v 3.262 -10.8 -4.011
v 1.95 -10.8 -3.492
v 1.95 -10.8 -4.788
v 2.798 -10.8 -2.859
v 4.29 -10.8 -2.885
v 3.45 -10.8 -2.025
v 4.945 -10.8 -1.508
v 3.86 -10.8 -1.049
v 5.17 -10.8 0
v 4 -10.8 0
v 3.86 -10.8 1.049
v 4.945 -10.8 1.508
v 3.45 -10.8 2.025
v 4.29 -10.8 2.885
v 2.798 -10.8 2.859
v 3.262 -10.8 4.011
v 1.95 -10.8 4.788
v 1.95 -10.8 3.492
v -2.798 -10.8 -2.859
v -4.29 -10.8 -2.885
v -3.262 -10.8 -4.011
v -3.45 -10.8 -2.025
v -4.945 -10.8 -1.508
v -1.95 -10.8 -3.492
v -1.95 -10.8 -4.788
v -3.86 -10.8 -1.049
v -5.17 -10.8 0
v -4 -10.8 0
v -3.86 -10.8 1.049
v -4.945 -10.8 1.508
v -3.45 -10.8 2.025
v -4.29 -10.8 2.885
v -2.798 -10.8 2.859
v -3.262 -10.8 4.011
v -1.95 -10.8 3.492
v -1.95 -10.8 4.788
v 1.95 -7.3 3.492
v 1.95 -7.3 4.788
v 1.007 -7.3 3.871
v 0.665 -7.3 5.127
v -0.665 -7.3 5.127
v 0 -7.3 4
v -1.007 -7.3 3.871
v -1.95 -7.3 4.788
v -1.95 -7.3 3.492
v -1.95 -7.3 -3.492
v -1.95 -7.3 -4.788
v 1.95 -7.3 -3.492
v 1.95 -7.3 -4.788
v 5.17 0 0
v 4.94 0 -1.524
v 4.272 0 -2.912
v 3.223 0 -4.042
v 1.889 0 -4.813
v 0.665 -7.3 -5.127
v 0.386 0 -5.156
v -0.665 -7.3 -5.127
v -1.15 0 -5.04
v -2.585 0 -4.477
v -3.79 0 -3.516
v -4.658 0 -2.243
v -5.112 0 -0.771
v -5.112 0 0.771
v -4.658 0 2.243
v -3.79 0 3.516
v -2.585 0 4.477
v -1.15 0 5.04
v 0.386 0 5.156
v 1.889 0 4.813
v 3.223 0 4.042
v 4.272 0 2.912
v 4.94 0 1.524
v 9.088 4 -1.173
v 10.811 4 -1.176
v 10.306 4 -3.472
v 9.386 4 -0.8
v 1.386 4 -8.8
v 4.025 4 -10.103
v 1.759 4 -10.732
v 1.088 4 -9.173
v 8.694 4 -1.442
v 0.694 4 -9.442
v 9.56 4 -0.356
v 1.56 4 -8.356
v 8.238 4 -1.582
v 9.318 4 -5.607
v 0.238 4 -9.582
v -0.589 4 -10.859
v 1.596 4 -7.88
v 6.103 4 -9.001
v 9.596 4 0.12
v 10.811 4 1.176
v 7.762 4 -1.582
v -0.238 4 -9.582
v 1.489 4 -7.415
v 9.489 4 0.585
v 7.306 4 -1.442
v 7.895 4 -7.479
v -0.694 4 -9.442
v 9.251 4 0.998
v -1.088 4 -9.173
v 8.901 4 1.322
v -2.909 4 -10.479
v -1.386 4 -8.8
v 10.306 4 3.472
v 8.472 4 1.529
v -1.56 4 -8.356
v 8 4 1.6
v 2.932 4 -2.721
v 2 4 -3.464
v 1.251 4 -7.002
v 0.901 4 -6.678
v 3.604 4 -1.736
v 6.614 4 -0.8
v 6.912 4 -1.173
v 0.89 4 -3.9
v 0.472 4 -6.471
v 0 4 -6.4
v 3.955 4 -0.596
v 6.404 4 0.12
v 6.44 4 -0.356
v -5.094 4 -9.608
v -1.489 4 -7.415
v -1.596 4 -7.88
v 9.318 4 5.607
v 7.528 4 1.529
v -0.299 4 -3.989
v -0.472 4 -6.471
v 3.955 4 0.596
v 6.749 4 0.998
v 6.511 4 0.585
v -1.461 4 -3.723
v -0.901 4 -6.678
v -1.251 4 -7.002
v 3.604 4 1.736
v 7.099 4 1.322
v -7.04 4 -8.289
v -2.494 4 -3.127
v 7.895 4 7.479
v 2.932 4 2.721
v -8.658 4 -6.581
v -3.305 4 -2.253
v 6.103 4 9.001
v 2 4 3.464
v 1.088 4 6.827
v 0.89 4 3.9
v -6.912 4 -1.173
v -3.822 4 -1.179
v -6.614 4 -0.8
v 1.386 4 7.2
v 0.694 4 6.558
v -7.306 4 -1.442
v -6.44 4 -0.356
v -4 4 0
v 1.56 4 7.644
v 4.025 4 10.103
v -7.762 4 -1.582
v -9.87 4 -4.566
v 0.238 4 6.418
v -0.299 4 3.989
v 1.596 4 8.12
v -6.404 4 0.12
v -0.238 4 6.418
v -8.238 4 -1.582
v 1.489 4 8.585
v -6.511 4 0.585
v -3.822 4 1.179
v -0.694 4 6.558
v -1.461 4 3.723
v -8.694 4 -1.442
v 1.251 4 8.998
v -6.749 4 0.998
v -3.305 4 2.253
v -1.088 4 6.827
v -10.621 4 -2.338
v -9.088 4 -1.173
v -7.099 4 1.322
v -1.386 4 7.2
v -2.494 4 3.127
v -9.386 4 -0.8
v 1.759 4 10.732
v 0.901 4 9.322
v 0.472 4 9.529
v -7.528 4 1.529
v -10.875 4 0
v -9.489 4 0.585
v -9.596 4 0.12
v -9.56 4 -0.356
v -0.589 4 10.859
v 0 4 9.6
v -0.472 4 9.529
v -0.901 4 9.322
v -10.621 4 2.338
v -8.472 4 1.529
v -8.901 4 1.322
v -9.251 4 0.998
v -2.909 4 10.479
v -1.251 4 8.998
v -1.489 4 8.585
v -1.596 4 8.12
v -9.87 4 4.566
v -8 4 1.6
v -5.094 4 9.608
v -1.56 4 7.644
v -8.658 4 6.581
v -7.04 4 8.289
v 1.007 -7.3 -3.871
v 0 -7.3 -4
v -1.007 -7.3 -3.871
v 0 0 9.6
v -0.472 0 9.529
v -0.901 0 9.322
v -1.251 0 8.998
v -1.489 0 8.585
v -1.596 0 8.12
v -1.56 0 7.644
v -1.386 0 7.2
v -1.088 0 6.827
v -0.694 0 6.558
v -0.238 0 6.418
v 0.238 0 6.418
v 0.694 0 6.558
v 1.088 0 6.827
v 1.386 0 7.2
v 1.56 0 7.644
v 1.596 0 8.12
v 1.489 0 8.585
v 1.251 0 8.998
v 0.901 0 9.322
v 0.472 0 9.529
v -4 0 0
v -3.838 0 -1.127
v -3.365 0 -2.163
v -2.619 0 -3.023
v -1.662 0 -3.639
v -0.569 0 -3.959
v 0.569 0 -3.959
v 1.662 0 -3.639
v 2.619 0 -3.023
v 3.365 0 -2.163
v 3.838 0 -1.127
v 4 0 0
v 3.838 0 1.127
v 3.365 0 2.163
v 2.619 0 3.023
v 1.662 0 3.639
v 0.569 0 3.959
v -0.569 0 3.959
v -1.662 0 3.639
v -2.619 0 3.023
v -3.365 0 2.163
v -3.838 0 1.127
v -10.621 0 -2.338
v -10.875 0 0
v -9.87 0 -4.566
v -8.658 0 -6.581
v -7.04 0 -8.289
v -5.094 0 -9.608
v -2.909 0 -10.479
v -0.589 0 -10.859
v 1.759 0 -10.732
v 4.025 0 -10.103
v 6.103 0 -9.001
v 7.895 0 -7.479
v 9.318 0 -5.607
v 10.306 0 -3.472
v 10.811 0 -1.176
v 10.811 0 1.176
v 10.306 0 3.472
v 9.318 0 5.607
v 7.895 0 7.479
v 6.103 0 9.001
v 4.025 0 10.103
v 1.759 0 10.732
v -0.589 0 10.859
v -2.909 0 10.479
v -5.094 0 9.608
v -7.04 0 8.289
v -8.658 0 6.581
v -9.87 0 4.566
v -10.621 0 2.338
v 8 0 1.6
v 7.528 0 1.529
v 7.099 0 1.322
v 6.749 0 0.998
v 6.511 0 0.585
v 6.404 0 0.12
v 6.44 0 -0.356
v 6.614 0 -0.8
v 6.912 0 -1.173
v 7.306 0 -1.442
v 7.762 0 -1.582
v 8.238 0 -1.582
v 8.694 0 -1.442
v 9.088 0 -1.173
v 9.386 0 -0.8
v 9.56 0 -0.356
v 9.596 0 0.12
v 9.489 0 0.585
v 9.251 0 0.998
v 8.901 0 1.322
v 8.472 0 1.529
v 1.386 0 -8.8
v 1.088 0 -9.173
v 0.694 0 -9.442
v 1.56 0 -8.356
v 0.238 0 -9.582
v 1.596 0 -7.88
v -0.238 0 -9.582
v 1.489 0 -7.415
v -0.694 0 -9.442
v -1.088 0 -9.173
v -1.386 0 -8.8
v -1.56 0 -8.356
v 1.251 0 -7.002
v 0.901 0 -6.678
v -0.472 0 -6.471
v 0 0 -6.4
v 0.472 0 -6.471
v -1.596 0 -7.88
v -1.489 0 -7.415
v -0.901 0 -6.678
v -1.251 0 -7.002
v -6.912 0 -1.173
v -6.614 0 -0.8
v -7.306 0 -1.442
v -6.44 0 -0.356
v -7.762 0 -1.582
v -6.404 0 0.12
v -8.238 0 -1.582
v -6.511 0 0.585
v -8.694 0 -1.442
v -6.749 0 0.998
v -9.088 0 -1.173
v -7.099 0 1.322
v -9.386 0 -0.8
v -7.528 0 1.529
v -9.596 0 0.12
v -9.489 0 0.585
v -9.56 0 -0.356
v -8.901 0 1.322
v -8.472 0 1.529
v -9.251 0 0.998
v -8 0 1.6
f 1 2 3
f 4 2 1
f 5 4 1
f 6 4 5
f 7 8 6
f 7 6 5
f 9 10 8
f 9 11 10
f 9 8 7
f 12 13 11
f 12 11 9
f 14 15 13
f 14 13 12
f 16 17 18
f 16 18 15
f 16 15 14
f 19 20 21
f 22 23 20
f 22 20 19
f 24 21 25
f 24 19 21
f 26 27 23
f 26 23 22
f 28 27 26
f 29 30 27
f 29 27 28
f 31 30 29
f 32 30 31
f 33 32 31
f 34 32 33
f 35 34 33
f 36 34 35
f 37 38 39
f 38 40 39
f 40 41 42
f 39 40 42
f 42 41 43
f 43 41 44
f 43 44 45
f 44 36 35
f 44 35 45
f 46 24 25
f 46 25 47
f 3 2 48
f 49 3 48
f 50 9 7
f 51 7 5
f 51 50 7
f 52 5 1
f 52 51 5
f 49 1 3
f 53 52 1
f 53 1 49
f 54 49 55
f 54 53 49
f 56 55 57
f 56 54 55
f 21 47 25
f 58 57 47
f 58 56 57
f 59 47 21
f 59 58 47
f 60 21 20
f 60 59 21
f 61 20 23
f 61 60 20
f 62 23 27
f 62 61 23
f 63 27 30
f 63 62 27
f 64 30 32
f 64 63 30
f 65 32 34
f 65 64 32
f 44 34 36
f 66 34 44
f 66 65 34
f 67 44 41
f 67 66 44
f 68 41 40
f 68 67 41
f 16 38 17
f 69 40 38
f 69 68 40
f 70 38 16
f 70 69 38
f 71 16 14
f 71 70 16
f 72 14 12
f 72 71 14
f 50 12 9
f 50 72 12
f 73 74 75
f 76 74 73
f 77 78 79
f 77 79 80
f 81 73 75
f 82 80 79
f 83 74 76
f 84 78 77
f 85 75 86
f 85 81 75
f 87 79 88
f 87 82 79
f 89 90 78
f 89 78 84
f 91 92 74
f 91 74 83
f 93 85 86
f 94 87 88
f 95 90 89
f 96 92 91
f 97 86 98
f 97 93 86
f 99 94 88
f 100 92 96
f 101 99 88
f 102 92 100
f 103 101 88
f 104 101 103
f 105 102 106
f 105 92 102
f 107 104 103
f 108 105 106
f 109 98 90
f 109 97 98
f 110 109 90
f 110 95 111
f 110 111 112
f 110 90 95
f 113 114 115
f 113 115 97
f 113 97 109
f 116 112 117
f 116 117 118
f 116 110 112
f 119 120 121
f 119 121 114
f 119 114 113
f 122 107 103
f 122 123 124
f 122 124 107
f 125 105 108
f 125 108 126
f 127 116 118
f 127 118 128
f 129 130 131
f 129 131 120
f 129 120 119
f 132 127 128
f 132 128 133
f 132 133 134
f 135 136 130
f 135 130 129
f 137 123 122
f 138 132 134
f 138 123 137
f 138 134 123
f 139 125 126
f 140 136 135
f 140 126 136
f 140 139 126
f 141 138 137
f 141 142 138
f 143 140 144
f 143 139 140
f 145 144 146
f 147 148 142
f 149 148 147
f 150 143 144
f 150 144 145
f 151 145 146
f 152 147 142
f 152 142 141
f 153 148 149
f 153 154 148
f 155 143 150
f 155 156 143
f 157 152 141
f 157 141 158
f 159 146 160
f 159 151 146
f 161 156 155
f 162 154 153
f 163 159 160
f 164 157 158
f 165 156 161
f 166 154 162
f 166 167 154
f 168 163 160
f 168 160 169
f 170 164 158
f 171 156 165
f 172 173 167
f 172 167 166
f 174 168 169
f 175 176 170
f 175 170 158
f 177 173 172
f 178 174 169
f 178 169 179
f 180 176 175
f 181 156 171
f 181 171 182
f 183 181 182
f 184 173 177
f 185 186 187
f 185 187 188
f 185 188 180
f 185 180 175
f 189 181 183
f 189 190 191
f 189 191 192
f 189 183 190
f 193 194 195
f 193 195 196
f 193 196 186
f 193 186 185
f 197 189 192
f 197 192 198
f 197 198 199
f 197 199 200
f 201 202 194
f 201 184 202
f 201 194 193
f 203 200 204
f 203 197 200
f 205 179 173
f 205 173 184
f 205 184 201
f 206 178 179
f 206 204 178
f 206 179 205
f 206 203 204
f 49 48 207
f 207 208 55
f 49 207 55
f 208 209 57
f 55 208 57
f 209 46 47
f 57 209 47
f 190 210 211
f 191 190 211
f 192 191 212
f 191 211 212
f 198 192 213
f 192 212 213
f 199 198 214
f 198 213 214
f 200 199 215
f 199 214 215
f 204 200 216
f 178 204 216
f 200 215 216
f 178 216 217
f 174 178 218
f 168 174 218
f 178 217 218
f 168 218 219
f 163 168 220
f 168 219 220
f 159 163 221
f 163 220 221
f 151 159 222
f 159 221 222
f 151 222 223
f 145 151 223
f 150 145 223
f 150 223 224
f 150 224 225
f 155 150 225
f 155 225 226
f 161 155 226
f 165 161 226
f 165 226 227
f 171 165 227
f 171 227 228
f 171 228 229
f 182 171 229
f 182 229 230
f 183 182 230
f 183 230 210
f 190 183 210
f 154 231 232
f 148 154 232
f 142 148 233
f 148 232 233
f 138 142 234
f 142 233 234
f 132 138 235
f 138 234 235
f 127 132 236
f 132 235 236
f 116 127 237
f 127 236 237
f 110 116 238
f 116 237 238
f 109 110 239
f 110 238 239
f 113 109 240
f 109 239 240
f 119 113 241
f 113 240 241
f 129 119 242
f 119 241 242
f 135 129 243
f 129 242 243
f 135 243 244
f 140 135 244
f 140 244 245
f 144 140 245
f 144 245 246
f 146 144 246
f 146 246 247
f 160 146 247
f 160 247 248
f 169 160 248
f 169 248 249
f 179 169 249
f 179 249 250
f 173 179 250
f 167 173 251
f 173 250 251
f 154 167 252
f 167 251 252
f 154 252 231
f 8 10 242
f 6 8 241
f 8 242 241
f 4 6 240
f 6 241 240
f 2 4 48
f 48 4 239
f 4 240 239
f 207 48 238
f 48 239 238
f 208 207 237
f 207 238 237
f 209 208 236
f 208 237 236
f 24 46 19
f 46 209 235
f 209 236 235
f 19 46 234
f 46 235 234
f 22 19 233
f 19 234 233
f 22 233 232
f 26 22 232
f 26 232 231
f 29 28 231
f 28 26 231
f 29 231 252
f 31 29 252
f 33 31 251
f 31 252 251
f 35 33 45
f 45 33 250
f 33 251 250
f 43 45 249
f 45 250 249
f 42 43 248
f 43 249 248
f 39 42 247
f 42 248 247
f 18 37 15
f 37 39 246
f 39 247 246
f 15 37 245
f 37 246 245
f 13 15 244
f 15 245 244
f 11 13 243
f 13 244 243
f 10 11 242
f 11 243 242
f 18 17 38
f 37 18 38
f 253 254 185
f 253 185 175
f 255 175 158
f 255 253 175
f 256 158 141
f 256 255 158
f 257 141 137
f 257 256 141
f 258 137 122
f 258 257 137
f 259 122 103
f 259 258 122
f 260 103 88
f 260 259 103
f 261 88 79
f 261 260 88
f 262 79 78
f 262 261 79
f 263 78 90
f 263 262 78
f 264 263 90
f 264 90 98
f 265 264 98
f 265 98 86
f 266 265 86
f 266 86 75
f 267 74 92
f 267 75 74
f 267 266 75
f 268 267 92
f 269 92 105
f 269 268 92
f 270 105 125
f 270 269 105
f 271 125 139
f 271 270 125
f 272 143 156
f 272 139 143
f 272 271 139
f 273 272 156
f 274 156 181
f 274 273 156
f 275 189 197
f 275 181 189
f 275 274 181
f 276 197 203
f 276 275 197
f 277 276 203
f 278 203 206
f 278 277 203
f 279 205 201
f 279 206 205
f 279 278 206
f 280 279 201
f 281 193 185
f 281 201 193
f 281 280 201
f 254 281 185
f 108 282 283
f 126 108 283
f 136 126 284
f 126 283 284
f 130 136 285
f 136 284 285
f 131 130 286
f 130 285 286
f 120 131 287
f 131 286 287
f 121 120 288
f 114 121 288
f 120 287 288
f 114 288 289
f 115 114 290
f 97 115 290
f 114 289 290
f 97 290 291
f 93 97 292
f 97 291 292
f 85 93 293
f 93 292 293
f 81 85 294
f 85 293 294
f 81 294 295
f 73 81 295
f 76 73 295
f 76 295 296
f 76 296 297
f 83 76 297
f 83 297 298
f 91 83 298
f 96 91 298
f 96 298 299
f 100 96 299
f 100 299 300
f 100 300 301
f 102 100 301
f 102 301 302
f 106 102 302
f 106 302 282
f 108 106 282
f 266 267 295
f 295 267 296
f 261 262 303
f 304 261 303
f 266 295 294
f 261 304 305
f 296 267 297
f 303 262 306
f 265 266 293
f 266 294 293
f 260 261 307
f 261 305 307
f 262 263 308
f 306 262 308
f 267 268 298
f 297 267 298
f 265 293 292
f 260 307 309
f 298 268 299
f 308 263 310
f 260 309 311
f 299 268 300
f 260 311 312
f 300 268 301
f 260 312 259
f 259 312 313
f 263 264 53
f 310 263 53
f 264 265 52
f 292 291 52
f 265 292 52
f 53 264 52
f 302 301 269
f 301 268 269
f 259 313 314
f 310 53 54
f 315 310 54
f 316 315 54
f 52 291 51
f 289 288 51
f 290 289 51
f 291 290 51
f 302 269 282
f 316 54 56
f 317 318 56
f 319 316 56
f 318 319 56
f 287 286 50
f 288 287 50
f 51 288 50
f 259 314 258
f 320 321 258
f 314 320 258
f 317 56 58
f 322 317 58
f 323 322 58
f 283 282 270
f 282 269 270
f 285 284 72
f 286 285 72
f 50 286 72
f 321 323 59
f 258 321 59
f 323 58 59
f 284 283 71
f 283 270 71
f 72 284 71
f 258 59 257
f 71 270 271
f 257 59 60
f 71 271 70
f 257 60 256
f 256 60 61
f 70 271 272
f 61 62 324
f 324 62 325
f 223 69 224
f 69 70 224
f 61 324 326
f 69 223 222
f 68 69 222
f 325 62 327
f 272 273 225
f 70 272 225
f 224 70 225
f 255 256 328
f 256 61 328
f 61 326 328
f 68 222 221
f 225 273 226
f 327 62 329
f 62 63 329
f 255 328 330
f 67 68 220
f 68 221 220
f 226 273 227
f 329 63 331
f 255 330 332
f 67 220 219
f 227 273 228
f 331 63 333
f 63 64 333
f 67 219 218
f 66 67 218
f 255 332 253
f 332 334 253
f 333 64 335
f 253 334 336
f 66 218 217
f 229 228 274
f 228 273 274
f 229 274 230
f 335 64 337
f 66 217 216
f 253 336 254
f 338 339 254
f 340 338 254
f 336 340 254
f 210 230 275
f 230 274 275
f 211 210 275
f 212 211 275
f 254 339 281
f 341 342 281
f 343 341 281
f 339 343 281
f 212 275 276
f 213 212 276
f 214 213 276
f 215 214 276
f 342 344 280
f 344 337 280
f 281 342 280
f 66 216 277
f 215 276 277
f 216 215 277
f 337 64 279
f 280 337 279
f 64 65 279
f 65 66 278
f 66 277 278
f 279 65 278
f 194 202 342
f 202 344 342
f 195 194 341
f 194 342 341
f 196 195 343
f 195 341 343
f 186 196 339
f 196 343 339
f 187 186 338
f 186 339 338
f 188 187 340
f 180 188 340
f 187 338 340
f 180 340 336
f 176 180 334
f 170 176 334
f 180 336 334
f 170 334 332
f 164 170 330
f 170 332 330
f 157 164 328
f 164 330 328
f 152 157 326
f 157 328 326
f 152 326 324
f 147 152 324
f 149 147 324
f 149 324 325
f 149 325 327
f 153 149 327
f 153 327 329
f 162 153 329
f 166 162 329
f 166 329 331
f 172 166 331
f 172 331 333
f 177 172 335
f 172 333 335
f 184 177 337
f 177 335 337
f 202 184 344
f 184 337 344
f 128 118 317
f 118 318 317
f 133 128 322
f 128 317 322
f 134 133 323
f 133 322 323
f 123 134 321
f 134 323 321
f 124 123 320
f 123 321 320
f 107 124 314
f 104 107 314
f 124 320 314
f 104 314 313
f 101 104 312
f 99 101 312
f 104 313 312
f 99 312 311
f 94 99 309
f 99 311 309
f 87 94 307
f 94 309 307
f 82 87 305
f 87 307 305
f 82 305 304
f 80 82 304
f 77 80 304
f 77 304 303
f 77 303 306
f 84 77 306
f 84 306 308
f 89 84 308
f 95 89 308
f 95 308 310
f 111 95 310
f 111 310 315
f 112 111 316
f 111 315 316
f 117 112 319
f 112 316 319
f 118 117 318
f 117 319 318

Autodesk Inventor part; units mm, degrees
ref_plane "YZ Plane" through (0, 0, 0) normal (1, 0, 0) x (0, 1, 0)
ref_plane "XZ Plane" through (0, 0, 0) normal (0, 1, 0) x (-1, 0, 0)
ref_plane "XY Plane" through (0, 0, 0) normal (0, 0, 1) x (1, 0, 0)
sketch "Szkic1" plane through (0, 0, 0) normal (0, 1, 0) x (-1, 0, 0)
  circle A0 centre (0, 0) radius 10.875
  circle A1 centre (0, 0) radius 4
  point P0 (8, 0)
  point P1 (0, -8)
  point P2 (-8, 0)
  point P3 (0, 8)
  dimension "d0" = 21.75
  dimension "d1" = 8
  dimension "d2" = 8
  dimension "d5" = 360
extrude "Wyciągnięcie proste1" add sketch "Szkic1" along normal blind 4
sketch "Szkic2" plane through (0, 4, 0) normal (0, 1, 0) x (1, 0, 0)
  circle A0 centre (0, 0) radius 4 projected
  circle A1 centre (0, 0) radius 10.875 projected
  point P0 (-8, 0)
  point P1 (0, -8)
  point P2 (8, 0)
  point P3 (0, 8)
  dimension "d11" = 360
  dimension "d20" = 8
hole "Otwór1" at (-8, 4, 0) at (0, 4, 8) at (8, 4, 0) at (0, 4, -8) direction (0, -1, 0) diameter 3.2 end through all
sketch "Szkic3" plane through (0, 0, 0) normal (0, -1, 0) x (1, 0, 0)
  circle A0 centre (0, 0) radius 5.17
  circle A1 centre (0, 0) radius 4 projected
  dimension "d21" = 10.34
extrude "Wyciągnięcie proste2" add sketch "Szkic3" along normal blind 10.8
sketch "Szkic4" plane through (0, 0, 0) normal (1, 0, 0) x (0, 1, 0)
  line L0 (-10.8, 5.17) -> (-7.3, 5.17)
  line L1 (-7.3, 5.17) -> (-7.3, -5.17)
  line L2 (-7.3, -5.17) -> (-10.8, -5.17)
  line L3 (-10.8, -5.17) -> (-10.8, 5.17)
  line L4 (0, -5.17) -> (0, 5.17) projected
  line L5 (-10.8, -4) -> (-10.8, 4) projected
  line L6 (0, 5.17) -> (-10.8, 5.17) projected
  line L7 (0, -5.17) -> (-10.8, -5.17) projected
  line L8 (-10.8, 0) -> (4, 0)
  line L9 (4, -10.875) -> (4, 10.875) projected
  point P0 (0, 0)
  dimension "d24" = 10.34
  dimension "d25" = 7.3
  dimension "d26" = 10.34
extrude "Wyciągnięcie proste3" cut sketch "Szkic4" along normal mid plane 3.9 contours L0 L1 L8 L3 | L1 L2 L3 L8
equation "\"d24\" = d26"
properties part number "TR8_AntiBacklashNutMain"
